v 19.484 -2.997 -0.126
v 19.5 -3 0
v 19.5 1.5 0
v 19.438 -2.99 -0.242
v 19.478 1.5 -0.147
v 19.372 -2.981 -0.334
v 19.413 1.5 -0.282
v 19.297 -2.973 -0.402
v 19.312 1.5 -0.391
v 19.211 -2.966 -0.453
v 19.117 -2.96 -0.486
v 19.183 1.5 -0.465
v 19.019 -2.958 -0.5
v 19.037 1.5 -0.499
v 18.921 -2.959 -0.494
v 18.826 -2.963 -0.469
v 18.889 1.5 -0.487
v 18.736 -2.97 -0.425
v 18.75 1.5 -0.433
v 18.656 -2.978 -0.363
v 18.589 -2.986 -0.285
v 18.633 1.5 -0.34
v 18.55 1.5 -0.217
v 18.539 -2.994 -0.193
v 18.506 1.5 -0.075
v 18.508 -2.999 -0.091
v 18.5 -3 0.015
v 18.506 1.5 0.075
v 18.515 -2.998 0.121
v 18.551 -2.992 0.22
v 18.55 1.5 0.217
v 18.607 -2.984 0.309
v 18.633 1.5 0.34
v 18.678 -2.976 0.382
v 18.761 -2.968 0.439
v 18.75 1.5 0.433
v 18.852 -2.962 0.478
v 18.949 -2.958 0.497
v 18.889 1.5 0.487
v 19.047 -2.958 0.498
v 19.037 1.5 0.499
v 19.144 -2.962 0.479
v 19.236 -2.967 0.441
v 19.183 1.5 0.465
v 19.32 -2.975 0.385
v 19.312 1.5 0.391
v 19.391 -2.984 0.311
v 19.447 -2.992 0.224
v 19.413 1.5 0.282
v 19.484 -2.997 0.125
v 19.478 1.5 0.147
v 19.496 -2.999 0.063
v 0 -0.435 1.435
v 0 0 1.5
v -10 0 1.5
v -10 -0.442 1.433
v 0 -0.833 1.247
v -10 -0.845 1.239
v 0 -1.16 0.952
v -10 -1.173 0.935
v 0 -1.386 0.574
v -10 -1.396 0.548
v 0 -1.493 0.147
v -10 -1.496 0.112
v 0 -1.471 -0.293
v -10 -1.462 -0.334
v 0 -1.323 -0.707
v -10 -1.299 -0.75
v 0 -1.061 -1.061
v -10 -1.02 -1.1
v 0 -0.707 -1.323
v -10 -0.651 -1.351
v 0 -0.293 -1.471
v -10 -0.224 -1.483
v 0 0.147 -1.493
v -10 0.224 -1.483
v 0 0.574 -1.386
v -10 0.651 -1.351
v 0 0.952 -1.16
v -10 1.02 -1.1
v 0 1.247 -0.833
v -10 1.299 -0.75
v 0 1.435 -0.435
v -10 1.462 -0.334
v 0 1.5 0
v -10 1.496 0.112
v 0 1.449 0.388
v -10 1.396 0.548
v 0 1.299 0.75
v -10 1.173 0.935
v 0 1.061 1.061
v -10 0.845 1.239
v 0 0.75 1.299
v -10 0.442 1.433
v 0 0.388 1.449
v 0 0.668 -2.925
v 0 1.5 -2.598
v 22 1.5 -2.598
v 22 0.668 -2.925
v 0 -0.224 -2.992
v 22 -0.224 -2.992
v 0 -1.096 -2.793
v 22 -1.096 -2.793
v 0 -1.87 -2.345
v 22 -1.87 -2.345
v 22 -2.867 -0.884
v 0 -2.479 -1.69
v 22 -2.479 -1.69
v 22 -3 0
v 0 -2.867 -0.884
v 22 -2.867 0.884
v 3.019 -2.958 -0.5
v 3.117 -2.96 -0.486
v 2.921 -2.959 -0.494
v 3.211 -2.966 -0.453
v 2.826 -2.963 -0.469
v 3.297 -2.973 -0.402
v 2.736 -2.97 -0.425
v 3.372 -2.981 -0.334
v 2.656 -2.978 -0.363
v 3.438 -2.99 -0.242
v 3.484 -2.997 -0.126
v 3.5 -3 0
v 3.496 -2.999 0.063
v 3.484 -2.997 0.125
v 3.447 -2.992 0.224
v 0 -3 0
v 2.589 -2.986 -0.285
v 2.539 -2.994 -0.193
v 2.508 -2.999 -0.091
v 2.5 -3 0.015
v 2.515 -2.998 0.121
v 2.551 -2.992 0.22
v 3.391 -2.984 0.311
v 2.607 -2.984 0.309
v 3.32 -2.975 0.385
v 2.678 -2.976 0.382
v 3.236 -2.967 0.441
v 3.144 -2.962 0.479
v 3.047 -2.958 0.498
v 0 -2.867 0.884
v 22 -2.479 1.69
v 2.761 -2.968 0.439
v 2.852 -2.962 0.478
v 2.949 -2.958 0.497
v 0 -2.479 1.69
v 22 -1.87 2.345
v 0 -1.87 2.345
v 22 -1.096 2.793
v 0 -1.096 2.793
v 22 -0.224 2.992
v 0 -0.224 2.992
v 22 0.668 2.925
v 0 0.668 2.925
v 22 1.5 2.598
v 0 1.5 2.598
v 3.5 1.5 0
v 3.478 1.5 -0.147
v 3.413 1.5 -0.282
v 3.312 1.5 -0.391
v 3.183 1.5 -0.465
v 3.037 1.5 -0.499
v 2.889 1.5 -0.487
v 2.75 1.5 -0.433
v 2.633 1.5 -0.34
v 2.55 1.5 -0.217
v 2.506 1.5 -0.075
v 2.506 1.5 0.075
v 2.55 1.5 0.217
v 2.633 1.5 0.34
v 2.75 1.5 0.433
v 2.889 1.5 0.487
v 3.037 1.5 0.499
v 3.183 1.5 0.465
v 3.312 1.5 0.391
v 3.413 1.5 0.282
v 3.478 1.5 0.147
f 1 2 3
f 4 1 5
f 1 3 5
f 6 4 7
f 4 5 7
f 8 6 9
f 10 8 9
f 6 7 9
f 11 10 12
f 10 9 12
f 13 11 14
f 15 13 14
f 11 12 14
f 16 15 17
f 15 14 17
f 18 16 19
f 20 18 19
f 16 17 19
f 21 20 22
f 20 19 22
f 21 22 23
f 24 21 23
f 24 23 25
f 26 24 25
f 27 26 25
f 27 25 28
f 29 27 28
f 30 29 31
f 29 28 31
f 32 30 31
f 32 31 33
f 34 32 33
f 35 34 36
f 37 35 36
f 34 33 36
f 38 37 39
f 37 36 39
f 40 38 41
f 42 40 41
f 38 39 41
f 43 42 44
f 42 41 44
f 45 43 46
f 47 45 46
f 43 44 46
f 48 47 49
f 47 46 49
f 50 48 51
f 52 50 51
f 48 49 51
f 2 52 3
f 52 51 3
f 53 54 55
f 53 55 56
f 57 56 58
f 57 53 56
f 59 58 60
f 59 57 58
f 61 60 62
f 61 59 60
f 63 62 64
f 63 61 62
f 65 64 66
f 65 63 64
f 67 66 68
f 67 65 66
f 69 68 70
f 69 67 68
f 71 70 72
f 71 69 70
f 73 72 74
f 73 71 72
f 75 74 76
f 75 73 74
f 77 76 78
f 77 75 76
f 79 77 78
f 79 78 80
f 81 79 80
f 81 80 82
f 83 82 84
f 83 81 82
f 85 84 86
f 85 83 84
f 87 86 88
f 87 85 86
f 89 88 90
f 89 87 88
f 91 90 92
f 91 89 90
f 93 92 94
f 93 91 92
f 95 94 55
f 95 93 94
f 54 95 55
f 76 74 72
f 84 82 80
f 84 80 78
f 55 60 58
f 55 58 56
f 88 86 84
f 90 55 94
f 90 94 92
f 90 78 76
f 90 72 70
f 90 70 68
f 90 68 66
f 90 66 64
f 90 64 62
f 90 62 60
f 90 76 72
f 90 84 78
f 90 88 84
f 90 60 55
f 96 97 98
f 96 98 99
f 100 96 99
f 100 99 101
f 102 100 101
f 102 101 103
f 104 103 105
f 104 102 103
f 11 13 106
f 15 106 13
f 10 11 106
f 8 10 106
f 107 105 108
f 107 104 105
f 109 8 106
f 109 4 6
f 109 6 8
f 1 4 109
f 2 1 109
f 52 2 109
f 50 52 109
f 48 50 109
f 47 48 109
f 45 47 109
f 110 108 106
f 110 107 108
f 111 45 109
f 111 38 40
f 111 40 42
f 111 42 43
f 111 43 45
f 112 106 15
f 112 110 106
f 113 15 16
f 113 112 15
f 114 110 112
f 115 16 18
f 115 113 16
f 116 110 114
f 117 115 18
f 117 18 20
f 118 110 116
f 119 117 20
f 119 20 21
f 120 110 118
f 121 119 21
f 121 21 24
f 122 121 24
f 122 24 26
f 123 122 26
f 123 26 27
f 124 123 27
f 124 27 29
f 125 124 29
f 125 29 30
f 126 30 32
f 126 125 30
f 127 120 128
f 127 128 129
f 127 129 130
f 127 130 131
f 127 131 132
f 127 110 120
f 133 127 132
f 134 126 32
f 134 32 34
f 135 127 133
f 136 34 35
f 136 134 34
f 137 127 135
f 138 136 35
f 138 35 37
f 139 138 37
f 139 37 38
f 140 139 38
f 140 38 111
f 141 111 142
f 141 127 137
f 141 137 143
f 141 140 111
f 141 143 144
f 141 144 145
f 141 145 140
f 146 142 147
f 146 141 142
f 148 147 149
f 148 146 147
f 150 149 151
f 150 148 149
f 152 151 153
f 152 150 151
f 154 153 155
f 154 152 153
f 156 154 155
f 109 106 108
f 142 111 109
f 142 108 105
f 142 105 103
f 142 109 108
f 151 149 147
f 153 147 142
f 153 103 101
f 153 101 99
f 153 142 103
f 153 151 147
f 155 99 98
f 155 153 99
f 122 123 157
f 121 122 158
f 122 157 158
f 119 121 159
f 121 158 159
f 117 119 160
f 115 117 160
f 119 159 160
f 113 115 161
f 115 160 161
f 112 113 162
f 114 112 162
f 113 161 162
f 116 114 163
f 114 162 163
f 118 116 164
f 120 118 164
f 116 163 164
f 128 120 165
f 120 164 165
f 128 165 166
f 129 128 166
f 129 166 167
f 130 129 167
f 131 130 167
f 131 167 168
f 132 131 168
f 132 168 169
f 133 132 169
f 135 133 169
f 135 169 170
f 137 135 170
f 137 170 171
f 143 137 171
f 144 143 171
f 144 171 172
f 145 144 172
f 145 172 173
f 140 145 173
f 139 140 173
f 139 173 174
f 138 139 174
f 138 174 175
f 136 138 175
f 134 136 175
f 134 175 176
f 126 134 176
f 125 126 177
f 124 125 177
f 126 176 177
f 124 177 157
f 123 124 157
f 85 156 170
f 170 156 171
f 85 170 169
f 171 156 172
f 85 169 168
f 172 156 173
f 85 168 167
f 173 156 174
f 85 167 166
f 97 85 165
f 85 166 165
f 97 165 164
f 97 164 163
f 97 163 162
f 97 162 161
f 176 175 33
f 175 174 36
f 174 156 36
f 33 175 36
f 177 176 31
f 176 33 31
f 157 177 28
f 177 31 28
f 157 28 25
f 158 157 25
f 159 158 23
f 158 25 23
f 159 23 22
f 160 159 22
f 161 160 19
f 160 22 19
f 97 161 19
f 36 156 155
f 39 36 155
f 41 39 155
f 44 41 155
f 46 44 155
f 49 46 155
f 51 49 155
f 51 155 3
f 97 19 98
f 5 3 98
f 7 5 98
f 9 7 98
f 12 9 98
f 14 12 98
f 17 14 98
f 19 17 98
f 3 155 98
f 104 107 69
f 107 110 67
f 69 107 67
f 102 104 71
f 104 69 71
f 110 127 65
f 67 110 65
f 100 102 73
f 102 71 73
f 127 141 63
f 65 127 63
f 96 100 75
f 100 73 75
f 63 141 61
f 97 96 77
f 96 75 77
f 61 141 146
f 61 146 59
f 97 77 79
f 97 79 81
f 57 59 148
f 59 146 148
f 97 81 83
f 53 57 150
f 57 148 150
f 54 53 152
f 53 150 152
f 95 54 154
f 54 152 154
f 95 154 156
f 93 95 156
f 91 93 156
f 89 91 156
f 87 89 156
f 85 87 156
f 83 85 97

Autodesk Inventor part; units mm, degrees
ref_plane "Start Plane" through (0, 0, 0) normal (1, 0, 0) x (0, 1, 0)
ref_plane "XZ Plane" through (0, 0, 0) normal (0, 1, 0) x (-1, 0, 0)
ref_plane "XY Plane" through (0, 0, 0) normal (0, 0, 1) x (1, 0, 0)
sketch "Sketch4" plane through (0, 0, 0) normal (1, 0, 0) x (0, 1, 0)
  circle A0 centre (0, 0) radius 3
  dimension "d11" = 6
extrude "Extrusion2" add sketch "Sketch4" along normal blind 22
sketch "Sketch5" plane through (22, 0, 0) normal (1, 0, 0) x (0, 0, -1)
  circle A0 centre (0, 0) radius 3 projected
  line L0 (-2.5981, 1.5) -> (2.5981, 1.5)
  circle A1 centre (0, 0) radius 3
  dimension "d14" = 1.5
extrude "Extrusion3" cut sketch "Sketch5" against normal through all contours L0 A0 picked at (0.7274, 1.6862)
sketch "Sketch6" plane through (0, 0, 0) normal (-1, 0, 0) x (0, 0, 1)
  circle A0 centre (0, 0) radius 1.5
  dimension "d17" = 3
extrude "Extrusion4" add sketch "Sketch6" along normal blind 10
thread "Thread1" size "M3x0.5" class "6g" standard "ANSI Metric M Profile" full length
sketch "Sketch7" plane through (22, 1.5, 2.5981) normal (0, 1, 0) x (1, 0, 0)
  circle A0 centre (-19, 2.5981) radius 0.5
  circle A1 centre (-3, 2.5981) radius 0.5
  point P0 (-22, 2.5981)
  dimension "d22" = 1
  dimension "d23" = 3
  dimension "d24" = 15
  dimension "d25" = 16
extrude "Extrusion5" cut sketch "Sketch7" against normal through all
equation "\"Length\" = 18"
properties part number "centre shaft" material "Steel, Mild"
